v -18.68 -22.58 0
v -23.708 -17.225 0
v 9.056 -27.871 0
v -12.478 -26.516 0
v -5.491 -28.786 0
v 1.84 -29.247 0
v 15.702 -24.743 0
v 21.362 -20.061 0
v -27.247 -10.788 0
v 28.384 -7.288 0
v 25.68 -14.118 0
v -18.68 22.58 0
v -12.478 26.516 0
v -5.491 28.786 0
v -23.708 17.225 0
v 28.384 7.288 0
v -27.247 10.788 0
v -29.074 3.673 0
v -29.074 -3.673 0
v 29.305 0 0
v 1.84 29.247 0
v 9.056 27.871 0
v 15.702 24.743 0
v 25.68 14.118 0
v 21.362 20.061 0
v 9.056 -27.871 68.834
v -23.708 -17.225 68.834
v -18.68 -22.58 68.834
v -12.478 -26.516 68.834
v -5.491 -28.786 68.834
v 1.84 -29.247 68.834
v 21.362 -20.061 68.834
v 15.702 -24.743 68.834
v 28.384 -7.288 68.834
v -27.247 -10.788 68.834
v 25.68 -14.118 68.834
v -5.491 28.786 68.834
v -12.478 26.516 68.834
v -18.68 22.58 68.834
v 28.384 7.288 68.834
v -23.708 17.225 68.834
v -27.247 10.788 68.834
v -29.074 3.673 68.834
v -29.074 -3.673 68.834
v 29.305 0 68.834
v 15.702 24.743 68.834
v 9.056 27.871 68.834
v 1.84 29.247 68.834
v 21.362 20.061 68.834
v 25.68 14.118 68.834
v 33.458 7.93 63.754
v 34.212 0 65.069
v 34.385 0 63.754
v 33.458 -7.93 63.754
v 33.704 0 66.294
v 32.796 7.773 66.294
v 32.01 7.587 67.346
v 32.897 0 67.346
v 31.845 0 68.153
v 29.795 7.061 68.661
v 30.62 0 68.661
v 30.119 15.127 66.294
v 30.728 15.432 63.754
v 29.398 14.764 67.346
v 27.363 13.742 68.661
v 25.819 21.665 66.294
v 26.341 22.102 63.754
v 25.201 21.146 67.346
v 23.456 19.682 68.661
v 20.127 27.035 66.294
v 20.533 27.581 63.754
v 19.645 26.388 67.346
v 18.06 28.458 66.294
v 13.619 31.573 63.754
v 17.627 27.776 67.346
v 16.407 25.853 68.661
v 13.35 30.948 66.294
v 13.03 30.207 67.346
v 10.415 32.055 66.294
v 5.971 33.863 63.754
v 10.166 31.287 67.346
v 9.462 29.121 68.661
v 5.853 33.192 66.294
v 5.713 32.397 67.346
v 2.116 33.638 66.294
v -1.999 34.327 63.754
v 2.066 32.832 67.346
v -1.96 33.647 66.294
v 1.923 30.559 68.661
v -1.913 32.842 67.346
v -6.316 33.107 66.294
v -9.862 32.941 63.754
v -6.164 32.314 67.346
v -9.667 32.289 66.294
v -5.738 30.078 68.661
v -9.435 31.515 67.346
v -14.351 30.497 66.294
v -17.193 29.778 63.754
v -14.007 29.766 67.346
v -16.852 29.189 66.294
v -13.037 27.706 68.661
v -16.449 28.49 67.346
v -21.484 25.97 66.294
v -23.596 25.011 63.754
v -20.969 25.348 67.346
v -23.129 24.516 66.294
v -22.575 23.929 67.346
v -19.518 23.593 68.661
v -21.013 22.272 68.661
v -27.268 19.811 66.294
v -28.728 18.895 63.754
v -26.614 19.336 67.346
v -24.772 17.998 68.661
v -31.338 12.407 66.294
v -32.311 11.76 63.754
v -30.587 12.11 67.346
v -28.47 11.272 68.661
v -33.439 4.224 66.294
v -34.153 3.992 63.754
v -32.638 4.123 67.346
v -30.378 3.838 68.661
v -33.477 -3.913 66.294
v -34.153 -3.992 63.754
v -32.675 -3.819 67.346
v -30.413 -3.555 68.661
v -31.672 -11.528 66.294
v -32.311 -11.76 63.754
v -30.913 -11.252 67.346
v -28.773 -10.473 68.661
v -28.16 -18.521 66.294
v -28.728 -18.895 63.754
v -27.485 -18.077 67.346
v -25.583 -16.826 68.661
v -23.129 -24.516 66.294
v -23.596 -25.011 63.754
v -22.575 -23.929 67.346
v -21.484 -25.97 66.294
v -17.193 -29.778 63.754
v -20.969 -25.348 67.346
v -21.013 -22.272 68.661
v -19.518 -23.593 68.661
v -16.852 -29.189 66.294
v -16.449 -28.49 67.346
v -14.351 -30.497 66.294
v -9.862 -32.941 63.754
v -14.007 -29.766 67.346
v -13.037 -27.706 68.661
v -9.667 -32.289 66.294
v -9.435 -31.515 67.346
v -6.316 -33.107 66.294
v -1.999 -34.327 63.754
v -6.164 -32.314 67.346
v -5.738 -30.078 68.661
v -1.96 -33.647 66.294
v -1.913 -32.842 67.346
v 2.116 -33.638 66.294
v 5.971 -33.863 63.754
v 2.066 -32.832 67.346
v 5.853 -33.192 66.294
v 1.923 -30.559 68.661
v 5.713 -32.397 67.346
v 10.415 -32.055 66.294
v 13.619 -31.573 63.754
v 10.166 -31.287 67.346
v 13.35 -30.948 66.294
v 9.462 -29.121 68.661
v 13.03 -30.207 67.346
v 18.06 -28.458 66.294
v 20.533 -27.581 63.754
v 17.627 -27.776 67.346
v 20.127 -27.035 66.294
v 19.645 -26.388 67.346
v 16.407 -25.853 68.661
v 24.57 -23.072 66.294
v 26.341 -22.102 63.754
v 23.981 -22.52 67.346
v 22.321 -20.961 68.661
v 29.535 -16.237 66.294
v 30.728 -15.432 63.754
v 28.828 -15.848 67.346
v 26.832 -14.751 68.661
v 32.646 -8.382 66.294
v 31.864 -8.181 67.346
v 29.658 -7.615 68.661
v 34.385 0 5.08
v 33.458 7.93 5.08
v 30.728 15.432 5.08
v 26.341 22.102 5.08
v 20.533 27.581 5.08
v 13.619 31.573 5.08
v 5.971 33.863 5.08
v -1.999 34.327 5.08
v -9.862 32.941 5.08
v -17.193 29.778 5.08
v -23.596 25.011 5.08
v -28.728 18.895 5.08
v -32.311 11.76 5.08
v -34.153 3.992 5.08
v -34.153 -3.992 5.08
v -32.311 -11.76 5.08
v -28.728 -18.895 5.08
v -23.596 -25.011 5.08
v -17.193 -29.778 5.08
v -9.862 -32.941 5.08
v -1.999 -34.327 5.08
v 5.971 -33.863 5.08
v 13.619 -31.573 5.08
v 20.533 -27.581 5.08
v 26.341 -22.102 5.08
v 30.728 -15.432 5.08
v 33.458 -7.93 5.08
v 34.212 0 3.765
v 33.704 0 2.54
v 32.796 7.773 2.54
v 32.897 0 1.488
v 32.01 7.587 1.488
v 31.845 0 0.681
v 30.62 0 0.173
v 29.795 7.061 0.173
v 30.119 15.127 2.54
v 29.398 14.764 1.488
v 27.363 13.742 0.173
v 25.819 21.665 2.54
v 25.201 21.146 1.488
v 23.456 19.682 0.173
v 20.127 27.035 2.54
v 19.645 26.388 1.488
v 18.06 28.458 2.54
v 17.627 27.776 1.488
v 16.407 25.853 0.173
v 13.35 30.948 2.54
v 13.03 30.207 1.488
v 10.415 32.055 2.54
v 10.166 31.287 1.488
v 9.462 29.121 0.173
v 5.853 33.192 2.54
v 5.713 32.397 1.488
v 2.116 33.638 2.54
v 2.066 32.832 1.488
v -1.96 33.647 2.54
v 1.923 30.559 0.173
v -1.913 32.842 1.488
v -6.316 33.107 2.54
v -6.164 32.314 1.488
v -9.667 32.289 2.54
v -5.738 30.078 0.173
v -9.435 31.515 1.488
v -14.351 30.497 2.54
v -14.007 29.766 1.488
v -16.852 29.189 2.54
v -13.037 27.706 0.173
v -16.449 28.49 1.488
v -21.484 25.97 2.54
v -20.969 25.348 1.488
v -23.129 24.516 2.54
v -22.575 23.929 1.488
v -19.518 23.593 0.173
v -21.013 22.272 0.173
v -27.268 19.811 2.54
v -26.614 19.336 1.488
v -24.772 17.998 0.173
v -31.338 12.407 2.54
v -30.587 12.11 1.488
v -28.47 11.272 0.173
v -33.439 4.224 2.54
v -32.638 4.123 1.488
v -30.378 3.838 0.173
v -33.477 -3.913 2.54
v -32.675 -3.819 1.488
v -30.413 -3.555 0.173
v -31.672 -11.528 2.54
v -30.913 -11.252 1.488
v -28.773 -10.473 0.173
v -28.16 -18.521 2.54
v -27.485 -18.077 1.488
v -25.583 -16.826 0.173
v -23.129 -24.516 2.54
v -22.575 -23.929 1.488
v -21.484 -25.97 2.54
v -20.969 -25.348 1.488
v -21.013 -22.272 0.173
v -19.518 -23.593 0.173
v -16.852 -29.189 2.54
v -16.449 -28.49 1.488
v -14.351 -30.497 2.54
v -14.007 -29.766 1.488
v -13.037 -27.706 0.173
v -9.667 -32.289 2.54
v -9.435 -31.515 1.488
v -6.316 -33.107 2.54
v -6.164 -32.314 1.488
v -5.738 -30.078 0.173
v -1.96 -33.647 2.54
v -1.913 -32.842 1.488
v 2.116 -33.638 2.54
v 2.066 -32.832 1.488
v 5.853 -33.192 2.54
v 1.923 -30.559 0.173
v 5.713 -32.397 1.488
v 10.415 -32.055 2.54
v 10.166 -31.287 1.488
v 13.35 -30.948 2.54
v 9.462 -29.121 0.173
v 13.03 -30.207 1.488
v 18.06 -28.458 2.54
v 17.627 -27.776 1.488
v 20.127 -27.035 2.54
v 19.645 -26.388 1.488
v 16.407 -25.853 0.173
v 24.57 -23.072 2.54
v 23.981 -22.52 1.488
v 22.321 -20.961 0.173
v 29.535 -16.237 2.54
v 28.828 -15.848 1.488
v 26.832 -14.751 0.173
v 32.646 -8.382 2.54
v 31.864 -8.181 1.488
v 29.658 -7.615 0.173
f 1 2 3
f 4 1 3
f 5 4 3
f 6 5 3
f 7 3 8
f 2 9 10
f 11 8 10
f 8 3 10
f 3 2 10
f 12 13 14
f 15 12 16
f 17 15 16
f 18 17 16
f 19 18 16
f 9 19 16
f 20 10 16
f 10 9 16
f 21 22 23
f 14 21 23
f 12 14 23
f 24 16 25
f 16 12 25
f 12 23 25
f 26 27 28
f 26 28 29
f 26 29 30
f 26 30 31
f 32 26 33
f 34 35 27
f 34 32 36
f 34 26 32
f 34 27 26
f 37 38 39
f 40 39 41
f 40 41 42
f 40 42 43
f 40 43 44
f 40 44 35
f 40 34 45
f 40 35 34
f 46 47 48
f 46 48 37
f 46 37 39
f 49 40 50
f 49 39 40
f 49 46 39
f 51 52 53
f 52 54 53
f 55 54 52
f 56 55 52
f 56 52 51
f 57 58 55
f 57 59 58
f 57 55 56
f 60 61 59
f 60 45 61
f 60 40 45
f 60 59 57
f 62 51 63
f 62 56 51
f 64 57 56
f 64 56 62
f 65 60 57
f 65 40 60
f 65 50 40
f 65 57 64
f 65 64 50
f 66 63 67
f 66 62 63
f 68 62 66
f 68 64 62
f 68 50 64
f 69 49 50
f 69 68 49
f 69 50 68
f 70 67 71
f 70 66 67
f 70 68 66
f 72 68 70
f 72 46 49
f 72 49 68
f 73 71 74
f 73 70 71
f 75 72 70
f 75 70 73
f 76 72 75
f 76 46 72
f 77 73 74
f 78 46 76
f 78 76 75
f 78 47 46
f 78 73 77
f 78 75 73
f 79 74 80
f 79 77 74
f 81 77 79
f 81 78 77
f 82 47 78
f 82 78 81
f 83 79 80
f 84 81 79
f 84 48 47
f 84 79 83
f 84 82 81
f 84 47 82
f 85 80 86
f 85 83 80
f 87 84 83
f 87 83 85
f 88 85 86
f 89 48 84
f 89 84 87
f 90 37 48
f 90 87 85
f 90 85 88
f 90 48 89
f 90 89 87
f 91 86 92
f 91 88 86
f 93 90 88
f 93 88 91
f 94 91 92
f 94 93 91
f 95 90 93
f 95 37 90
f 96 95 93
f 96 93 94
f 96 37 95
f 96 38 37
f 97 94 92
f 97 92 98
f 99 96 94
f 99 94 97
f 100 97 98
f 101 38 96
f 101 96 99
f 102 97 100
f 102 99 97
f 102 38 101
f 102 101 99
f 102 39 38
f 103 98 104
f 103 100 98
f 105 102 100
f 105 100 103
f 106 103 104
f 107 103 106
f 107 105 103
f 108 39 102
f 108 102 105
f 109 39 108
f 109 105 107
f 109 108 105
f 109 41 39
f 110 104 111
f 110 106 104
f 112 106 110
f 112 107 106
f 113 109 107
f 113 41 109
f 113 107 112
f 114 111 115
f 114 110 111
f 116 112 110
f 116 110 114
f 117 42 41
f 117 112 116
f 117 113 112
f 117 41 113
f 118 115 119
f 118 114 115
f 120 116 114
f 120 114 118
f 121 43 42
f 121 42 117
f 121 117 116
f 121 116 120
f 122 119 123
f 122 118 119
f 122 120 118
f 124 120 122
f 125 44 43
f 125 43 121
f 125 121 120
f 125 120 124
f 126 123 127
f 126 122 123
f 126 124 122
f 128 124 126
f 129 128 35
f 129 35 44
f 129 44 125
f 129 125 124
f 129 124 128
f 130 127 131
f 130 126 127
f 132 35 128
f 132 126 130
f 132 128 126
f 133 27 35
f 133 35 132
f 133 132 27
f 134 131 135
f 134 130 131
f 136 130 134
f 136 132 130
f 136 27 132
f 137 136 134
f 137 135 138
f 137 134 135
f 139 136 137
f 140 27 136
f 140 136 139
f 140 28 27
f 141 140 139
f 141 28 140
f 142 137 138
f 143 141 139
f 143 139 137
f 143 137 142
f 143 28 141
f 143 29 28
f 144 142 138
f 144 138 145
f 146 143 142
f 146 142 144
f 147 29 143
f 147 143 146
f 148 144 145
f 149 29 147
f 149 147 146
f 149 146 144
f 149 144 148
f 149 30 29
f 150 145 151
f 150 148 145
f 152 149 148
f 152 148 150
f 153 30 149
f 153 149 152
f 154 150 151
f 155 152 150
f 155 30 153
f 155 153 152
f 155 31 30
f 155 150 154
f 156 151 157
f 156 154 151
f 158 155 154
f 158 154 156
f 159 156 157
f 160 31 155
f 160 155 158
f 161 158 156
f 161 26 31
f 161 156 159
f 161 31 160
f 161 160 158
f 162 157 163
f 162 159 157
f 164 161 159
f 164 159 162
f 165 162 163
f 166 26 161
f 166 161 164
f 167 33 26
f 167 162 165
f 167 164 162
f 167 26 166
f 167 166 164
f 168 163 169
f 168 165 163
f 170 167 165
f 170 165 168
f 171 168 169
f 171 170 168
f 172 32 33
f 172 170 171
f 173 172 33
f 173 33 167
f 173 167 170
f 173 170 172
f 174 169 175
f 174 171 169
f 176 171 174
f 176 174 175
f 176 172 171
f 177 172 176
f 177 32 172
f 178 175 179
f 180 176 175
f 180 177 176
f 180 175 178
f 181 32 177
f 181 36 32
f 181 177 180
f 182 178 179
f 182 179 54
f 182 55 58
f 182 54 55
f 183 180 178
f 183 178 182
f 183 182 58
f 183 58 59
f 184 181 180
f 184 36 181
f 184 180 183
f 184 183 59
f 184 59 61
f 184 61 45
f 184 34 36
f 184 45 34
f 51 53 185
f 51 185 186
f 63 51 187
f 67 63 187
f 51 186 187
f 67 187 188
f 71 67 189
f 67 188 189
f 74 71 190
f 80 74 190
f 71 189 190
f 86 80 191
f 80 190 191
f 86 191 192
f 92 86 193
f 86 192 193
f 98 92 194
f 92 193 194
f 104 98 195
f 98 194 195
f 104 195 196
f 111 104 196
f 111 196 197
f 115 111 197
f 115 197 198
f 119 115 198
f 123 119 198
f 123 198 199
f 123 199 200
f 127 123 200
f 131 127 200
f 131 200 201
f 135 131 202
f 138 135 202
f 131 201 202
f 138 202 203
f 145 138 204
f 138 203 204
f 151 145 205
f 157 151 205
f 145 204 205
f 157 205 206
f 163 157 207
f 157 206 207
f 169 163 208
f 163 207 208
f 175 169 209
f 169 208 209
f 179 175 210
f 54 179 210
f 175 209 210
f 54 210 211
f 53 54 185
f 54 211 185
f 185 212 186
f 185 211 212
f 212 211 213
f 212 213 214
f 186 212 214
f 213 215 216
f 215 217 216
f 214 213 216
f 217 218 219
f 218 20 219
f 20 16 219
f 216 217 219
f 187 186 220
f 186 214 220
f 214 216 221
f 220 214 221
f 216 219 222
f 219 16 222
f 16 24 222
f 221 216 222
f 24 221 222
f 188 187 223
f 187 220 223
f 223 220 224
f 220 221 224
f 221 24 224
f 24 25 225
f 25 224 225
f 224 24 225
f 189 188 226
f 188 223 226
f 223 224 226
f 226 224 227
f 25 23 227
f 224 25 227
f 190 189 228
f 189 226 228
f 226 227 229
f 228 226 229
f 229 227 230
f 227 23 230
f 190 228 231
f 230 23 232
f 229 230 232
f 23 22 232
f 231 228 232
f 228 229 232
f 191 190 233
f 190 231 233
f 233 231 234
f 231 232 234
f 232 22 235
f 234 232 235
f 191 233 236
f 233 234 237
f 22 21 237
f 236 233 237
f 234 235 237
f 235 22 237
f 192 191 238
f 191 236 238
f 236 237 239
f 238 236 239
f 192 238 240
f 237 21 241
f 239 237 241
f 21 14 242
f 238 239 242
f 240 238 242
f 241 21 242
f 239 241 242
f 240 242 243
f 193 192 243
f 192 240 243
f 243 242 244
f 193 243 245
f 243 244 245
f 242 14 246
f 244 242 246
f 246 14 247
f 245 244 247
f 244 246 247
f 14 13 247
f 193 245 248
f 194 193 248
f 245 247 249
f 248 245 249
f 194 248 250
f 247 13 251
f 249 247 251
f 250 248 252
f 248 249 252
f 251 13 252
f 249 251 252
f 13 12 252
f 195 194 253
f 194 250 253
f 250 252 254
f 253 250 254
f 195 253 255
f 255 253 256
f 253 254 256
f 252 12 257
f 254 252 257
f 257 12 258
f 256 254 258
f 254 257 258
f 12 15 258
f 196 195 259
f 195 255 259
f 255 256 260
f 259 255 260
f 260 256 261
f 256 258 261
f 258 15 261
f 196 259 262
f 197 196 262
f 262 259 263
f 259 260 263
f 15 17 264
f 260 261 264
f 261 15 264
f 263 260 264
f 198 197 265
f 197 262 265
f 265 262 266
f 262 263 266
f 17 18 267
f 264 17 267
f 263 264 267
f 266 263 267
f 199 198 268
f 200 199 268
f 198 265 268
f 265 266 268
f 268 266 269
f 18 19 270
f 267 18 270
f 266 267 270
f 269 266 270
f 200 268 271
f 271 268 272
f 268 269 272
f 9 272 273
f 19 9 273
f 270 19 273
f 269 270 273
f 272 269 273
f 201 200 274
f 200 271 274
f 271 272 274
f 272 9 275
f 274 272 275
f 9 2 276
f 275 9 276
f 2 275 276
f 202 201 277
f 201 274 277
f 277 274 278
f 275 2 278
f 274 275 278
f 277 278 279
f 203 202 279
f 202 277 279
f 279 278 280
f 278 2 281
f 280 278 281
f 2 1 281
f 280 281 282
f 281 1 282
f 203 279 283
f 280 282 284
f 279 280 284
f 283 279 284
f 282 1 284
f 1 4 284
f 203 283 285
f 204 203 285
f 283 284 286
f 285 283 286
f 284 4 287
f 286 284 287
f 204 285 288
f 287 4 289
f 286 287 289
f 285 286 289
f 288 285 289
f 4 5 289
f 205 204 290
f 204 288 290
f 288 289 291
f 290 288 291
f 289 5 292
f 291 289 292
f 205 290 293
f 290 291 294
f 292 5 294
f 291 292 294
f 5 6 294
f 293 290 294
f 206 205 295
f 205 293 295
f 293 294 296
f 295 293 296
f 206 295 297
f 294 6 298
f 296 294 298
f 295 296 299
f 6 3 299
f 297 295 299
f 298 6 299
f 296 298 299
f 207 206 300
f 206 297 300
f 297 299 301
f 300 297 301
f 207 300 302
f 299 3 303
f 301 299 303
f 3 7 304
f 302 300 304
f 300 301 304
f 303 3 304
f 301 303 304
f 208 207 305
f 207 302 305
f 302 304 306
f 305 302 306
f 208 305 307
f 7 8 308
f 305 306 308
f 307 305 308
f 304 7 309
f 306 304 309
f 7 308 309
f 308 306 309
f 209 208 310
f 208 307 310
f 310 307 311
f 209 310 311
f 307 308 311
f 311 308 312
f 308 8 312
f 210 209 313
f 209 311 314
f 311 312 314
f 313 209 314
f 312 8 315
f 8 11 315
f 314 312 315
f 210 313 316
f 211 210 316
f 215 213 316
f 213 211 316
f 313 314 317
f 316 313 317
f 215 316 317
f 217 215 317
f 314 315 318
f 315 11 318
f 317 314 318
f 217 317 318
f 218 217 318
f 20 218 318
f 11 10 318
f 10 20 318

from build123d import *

# Parameters (mm, degrees)
F0_R     = 34.385089
F1_DEPTH = 68.834
F2_R     = 5.08
F3_R     = 5.08


with BuildPart() as f1:
    # F0 (on Top) → F1 (new body)
    with BuildSketch(Plane.XY):
        Circle(F0_R)
    extrude(amount=F1_DEPTH)

    # F2
    f2_edges = [f1.edges().sort_by_distance(p)[0] for p in [
        (-34.385089, 0, 68.834),
    ]]
    fillet(f2_edges, radius=F2_R)

    # F3
    f3_edges = [f1.edges().sort_by_distance(p)[0] for p in [
        (34.385089, 0, 31.877),
        (-34.385089, 0, 63.754),
        (-34.385089, 0, 0),
    ]]
    fillet(f3_edges, radius=F3_R)


solid = f1.part
